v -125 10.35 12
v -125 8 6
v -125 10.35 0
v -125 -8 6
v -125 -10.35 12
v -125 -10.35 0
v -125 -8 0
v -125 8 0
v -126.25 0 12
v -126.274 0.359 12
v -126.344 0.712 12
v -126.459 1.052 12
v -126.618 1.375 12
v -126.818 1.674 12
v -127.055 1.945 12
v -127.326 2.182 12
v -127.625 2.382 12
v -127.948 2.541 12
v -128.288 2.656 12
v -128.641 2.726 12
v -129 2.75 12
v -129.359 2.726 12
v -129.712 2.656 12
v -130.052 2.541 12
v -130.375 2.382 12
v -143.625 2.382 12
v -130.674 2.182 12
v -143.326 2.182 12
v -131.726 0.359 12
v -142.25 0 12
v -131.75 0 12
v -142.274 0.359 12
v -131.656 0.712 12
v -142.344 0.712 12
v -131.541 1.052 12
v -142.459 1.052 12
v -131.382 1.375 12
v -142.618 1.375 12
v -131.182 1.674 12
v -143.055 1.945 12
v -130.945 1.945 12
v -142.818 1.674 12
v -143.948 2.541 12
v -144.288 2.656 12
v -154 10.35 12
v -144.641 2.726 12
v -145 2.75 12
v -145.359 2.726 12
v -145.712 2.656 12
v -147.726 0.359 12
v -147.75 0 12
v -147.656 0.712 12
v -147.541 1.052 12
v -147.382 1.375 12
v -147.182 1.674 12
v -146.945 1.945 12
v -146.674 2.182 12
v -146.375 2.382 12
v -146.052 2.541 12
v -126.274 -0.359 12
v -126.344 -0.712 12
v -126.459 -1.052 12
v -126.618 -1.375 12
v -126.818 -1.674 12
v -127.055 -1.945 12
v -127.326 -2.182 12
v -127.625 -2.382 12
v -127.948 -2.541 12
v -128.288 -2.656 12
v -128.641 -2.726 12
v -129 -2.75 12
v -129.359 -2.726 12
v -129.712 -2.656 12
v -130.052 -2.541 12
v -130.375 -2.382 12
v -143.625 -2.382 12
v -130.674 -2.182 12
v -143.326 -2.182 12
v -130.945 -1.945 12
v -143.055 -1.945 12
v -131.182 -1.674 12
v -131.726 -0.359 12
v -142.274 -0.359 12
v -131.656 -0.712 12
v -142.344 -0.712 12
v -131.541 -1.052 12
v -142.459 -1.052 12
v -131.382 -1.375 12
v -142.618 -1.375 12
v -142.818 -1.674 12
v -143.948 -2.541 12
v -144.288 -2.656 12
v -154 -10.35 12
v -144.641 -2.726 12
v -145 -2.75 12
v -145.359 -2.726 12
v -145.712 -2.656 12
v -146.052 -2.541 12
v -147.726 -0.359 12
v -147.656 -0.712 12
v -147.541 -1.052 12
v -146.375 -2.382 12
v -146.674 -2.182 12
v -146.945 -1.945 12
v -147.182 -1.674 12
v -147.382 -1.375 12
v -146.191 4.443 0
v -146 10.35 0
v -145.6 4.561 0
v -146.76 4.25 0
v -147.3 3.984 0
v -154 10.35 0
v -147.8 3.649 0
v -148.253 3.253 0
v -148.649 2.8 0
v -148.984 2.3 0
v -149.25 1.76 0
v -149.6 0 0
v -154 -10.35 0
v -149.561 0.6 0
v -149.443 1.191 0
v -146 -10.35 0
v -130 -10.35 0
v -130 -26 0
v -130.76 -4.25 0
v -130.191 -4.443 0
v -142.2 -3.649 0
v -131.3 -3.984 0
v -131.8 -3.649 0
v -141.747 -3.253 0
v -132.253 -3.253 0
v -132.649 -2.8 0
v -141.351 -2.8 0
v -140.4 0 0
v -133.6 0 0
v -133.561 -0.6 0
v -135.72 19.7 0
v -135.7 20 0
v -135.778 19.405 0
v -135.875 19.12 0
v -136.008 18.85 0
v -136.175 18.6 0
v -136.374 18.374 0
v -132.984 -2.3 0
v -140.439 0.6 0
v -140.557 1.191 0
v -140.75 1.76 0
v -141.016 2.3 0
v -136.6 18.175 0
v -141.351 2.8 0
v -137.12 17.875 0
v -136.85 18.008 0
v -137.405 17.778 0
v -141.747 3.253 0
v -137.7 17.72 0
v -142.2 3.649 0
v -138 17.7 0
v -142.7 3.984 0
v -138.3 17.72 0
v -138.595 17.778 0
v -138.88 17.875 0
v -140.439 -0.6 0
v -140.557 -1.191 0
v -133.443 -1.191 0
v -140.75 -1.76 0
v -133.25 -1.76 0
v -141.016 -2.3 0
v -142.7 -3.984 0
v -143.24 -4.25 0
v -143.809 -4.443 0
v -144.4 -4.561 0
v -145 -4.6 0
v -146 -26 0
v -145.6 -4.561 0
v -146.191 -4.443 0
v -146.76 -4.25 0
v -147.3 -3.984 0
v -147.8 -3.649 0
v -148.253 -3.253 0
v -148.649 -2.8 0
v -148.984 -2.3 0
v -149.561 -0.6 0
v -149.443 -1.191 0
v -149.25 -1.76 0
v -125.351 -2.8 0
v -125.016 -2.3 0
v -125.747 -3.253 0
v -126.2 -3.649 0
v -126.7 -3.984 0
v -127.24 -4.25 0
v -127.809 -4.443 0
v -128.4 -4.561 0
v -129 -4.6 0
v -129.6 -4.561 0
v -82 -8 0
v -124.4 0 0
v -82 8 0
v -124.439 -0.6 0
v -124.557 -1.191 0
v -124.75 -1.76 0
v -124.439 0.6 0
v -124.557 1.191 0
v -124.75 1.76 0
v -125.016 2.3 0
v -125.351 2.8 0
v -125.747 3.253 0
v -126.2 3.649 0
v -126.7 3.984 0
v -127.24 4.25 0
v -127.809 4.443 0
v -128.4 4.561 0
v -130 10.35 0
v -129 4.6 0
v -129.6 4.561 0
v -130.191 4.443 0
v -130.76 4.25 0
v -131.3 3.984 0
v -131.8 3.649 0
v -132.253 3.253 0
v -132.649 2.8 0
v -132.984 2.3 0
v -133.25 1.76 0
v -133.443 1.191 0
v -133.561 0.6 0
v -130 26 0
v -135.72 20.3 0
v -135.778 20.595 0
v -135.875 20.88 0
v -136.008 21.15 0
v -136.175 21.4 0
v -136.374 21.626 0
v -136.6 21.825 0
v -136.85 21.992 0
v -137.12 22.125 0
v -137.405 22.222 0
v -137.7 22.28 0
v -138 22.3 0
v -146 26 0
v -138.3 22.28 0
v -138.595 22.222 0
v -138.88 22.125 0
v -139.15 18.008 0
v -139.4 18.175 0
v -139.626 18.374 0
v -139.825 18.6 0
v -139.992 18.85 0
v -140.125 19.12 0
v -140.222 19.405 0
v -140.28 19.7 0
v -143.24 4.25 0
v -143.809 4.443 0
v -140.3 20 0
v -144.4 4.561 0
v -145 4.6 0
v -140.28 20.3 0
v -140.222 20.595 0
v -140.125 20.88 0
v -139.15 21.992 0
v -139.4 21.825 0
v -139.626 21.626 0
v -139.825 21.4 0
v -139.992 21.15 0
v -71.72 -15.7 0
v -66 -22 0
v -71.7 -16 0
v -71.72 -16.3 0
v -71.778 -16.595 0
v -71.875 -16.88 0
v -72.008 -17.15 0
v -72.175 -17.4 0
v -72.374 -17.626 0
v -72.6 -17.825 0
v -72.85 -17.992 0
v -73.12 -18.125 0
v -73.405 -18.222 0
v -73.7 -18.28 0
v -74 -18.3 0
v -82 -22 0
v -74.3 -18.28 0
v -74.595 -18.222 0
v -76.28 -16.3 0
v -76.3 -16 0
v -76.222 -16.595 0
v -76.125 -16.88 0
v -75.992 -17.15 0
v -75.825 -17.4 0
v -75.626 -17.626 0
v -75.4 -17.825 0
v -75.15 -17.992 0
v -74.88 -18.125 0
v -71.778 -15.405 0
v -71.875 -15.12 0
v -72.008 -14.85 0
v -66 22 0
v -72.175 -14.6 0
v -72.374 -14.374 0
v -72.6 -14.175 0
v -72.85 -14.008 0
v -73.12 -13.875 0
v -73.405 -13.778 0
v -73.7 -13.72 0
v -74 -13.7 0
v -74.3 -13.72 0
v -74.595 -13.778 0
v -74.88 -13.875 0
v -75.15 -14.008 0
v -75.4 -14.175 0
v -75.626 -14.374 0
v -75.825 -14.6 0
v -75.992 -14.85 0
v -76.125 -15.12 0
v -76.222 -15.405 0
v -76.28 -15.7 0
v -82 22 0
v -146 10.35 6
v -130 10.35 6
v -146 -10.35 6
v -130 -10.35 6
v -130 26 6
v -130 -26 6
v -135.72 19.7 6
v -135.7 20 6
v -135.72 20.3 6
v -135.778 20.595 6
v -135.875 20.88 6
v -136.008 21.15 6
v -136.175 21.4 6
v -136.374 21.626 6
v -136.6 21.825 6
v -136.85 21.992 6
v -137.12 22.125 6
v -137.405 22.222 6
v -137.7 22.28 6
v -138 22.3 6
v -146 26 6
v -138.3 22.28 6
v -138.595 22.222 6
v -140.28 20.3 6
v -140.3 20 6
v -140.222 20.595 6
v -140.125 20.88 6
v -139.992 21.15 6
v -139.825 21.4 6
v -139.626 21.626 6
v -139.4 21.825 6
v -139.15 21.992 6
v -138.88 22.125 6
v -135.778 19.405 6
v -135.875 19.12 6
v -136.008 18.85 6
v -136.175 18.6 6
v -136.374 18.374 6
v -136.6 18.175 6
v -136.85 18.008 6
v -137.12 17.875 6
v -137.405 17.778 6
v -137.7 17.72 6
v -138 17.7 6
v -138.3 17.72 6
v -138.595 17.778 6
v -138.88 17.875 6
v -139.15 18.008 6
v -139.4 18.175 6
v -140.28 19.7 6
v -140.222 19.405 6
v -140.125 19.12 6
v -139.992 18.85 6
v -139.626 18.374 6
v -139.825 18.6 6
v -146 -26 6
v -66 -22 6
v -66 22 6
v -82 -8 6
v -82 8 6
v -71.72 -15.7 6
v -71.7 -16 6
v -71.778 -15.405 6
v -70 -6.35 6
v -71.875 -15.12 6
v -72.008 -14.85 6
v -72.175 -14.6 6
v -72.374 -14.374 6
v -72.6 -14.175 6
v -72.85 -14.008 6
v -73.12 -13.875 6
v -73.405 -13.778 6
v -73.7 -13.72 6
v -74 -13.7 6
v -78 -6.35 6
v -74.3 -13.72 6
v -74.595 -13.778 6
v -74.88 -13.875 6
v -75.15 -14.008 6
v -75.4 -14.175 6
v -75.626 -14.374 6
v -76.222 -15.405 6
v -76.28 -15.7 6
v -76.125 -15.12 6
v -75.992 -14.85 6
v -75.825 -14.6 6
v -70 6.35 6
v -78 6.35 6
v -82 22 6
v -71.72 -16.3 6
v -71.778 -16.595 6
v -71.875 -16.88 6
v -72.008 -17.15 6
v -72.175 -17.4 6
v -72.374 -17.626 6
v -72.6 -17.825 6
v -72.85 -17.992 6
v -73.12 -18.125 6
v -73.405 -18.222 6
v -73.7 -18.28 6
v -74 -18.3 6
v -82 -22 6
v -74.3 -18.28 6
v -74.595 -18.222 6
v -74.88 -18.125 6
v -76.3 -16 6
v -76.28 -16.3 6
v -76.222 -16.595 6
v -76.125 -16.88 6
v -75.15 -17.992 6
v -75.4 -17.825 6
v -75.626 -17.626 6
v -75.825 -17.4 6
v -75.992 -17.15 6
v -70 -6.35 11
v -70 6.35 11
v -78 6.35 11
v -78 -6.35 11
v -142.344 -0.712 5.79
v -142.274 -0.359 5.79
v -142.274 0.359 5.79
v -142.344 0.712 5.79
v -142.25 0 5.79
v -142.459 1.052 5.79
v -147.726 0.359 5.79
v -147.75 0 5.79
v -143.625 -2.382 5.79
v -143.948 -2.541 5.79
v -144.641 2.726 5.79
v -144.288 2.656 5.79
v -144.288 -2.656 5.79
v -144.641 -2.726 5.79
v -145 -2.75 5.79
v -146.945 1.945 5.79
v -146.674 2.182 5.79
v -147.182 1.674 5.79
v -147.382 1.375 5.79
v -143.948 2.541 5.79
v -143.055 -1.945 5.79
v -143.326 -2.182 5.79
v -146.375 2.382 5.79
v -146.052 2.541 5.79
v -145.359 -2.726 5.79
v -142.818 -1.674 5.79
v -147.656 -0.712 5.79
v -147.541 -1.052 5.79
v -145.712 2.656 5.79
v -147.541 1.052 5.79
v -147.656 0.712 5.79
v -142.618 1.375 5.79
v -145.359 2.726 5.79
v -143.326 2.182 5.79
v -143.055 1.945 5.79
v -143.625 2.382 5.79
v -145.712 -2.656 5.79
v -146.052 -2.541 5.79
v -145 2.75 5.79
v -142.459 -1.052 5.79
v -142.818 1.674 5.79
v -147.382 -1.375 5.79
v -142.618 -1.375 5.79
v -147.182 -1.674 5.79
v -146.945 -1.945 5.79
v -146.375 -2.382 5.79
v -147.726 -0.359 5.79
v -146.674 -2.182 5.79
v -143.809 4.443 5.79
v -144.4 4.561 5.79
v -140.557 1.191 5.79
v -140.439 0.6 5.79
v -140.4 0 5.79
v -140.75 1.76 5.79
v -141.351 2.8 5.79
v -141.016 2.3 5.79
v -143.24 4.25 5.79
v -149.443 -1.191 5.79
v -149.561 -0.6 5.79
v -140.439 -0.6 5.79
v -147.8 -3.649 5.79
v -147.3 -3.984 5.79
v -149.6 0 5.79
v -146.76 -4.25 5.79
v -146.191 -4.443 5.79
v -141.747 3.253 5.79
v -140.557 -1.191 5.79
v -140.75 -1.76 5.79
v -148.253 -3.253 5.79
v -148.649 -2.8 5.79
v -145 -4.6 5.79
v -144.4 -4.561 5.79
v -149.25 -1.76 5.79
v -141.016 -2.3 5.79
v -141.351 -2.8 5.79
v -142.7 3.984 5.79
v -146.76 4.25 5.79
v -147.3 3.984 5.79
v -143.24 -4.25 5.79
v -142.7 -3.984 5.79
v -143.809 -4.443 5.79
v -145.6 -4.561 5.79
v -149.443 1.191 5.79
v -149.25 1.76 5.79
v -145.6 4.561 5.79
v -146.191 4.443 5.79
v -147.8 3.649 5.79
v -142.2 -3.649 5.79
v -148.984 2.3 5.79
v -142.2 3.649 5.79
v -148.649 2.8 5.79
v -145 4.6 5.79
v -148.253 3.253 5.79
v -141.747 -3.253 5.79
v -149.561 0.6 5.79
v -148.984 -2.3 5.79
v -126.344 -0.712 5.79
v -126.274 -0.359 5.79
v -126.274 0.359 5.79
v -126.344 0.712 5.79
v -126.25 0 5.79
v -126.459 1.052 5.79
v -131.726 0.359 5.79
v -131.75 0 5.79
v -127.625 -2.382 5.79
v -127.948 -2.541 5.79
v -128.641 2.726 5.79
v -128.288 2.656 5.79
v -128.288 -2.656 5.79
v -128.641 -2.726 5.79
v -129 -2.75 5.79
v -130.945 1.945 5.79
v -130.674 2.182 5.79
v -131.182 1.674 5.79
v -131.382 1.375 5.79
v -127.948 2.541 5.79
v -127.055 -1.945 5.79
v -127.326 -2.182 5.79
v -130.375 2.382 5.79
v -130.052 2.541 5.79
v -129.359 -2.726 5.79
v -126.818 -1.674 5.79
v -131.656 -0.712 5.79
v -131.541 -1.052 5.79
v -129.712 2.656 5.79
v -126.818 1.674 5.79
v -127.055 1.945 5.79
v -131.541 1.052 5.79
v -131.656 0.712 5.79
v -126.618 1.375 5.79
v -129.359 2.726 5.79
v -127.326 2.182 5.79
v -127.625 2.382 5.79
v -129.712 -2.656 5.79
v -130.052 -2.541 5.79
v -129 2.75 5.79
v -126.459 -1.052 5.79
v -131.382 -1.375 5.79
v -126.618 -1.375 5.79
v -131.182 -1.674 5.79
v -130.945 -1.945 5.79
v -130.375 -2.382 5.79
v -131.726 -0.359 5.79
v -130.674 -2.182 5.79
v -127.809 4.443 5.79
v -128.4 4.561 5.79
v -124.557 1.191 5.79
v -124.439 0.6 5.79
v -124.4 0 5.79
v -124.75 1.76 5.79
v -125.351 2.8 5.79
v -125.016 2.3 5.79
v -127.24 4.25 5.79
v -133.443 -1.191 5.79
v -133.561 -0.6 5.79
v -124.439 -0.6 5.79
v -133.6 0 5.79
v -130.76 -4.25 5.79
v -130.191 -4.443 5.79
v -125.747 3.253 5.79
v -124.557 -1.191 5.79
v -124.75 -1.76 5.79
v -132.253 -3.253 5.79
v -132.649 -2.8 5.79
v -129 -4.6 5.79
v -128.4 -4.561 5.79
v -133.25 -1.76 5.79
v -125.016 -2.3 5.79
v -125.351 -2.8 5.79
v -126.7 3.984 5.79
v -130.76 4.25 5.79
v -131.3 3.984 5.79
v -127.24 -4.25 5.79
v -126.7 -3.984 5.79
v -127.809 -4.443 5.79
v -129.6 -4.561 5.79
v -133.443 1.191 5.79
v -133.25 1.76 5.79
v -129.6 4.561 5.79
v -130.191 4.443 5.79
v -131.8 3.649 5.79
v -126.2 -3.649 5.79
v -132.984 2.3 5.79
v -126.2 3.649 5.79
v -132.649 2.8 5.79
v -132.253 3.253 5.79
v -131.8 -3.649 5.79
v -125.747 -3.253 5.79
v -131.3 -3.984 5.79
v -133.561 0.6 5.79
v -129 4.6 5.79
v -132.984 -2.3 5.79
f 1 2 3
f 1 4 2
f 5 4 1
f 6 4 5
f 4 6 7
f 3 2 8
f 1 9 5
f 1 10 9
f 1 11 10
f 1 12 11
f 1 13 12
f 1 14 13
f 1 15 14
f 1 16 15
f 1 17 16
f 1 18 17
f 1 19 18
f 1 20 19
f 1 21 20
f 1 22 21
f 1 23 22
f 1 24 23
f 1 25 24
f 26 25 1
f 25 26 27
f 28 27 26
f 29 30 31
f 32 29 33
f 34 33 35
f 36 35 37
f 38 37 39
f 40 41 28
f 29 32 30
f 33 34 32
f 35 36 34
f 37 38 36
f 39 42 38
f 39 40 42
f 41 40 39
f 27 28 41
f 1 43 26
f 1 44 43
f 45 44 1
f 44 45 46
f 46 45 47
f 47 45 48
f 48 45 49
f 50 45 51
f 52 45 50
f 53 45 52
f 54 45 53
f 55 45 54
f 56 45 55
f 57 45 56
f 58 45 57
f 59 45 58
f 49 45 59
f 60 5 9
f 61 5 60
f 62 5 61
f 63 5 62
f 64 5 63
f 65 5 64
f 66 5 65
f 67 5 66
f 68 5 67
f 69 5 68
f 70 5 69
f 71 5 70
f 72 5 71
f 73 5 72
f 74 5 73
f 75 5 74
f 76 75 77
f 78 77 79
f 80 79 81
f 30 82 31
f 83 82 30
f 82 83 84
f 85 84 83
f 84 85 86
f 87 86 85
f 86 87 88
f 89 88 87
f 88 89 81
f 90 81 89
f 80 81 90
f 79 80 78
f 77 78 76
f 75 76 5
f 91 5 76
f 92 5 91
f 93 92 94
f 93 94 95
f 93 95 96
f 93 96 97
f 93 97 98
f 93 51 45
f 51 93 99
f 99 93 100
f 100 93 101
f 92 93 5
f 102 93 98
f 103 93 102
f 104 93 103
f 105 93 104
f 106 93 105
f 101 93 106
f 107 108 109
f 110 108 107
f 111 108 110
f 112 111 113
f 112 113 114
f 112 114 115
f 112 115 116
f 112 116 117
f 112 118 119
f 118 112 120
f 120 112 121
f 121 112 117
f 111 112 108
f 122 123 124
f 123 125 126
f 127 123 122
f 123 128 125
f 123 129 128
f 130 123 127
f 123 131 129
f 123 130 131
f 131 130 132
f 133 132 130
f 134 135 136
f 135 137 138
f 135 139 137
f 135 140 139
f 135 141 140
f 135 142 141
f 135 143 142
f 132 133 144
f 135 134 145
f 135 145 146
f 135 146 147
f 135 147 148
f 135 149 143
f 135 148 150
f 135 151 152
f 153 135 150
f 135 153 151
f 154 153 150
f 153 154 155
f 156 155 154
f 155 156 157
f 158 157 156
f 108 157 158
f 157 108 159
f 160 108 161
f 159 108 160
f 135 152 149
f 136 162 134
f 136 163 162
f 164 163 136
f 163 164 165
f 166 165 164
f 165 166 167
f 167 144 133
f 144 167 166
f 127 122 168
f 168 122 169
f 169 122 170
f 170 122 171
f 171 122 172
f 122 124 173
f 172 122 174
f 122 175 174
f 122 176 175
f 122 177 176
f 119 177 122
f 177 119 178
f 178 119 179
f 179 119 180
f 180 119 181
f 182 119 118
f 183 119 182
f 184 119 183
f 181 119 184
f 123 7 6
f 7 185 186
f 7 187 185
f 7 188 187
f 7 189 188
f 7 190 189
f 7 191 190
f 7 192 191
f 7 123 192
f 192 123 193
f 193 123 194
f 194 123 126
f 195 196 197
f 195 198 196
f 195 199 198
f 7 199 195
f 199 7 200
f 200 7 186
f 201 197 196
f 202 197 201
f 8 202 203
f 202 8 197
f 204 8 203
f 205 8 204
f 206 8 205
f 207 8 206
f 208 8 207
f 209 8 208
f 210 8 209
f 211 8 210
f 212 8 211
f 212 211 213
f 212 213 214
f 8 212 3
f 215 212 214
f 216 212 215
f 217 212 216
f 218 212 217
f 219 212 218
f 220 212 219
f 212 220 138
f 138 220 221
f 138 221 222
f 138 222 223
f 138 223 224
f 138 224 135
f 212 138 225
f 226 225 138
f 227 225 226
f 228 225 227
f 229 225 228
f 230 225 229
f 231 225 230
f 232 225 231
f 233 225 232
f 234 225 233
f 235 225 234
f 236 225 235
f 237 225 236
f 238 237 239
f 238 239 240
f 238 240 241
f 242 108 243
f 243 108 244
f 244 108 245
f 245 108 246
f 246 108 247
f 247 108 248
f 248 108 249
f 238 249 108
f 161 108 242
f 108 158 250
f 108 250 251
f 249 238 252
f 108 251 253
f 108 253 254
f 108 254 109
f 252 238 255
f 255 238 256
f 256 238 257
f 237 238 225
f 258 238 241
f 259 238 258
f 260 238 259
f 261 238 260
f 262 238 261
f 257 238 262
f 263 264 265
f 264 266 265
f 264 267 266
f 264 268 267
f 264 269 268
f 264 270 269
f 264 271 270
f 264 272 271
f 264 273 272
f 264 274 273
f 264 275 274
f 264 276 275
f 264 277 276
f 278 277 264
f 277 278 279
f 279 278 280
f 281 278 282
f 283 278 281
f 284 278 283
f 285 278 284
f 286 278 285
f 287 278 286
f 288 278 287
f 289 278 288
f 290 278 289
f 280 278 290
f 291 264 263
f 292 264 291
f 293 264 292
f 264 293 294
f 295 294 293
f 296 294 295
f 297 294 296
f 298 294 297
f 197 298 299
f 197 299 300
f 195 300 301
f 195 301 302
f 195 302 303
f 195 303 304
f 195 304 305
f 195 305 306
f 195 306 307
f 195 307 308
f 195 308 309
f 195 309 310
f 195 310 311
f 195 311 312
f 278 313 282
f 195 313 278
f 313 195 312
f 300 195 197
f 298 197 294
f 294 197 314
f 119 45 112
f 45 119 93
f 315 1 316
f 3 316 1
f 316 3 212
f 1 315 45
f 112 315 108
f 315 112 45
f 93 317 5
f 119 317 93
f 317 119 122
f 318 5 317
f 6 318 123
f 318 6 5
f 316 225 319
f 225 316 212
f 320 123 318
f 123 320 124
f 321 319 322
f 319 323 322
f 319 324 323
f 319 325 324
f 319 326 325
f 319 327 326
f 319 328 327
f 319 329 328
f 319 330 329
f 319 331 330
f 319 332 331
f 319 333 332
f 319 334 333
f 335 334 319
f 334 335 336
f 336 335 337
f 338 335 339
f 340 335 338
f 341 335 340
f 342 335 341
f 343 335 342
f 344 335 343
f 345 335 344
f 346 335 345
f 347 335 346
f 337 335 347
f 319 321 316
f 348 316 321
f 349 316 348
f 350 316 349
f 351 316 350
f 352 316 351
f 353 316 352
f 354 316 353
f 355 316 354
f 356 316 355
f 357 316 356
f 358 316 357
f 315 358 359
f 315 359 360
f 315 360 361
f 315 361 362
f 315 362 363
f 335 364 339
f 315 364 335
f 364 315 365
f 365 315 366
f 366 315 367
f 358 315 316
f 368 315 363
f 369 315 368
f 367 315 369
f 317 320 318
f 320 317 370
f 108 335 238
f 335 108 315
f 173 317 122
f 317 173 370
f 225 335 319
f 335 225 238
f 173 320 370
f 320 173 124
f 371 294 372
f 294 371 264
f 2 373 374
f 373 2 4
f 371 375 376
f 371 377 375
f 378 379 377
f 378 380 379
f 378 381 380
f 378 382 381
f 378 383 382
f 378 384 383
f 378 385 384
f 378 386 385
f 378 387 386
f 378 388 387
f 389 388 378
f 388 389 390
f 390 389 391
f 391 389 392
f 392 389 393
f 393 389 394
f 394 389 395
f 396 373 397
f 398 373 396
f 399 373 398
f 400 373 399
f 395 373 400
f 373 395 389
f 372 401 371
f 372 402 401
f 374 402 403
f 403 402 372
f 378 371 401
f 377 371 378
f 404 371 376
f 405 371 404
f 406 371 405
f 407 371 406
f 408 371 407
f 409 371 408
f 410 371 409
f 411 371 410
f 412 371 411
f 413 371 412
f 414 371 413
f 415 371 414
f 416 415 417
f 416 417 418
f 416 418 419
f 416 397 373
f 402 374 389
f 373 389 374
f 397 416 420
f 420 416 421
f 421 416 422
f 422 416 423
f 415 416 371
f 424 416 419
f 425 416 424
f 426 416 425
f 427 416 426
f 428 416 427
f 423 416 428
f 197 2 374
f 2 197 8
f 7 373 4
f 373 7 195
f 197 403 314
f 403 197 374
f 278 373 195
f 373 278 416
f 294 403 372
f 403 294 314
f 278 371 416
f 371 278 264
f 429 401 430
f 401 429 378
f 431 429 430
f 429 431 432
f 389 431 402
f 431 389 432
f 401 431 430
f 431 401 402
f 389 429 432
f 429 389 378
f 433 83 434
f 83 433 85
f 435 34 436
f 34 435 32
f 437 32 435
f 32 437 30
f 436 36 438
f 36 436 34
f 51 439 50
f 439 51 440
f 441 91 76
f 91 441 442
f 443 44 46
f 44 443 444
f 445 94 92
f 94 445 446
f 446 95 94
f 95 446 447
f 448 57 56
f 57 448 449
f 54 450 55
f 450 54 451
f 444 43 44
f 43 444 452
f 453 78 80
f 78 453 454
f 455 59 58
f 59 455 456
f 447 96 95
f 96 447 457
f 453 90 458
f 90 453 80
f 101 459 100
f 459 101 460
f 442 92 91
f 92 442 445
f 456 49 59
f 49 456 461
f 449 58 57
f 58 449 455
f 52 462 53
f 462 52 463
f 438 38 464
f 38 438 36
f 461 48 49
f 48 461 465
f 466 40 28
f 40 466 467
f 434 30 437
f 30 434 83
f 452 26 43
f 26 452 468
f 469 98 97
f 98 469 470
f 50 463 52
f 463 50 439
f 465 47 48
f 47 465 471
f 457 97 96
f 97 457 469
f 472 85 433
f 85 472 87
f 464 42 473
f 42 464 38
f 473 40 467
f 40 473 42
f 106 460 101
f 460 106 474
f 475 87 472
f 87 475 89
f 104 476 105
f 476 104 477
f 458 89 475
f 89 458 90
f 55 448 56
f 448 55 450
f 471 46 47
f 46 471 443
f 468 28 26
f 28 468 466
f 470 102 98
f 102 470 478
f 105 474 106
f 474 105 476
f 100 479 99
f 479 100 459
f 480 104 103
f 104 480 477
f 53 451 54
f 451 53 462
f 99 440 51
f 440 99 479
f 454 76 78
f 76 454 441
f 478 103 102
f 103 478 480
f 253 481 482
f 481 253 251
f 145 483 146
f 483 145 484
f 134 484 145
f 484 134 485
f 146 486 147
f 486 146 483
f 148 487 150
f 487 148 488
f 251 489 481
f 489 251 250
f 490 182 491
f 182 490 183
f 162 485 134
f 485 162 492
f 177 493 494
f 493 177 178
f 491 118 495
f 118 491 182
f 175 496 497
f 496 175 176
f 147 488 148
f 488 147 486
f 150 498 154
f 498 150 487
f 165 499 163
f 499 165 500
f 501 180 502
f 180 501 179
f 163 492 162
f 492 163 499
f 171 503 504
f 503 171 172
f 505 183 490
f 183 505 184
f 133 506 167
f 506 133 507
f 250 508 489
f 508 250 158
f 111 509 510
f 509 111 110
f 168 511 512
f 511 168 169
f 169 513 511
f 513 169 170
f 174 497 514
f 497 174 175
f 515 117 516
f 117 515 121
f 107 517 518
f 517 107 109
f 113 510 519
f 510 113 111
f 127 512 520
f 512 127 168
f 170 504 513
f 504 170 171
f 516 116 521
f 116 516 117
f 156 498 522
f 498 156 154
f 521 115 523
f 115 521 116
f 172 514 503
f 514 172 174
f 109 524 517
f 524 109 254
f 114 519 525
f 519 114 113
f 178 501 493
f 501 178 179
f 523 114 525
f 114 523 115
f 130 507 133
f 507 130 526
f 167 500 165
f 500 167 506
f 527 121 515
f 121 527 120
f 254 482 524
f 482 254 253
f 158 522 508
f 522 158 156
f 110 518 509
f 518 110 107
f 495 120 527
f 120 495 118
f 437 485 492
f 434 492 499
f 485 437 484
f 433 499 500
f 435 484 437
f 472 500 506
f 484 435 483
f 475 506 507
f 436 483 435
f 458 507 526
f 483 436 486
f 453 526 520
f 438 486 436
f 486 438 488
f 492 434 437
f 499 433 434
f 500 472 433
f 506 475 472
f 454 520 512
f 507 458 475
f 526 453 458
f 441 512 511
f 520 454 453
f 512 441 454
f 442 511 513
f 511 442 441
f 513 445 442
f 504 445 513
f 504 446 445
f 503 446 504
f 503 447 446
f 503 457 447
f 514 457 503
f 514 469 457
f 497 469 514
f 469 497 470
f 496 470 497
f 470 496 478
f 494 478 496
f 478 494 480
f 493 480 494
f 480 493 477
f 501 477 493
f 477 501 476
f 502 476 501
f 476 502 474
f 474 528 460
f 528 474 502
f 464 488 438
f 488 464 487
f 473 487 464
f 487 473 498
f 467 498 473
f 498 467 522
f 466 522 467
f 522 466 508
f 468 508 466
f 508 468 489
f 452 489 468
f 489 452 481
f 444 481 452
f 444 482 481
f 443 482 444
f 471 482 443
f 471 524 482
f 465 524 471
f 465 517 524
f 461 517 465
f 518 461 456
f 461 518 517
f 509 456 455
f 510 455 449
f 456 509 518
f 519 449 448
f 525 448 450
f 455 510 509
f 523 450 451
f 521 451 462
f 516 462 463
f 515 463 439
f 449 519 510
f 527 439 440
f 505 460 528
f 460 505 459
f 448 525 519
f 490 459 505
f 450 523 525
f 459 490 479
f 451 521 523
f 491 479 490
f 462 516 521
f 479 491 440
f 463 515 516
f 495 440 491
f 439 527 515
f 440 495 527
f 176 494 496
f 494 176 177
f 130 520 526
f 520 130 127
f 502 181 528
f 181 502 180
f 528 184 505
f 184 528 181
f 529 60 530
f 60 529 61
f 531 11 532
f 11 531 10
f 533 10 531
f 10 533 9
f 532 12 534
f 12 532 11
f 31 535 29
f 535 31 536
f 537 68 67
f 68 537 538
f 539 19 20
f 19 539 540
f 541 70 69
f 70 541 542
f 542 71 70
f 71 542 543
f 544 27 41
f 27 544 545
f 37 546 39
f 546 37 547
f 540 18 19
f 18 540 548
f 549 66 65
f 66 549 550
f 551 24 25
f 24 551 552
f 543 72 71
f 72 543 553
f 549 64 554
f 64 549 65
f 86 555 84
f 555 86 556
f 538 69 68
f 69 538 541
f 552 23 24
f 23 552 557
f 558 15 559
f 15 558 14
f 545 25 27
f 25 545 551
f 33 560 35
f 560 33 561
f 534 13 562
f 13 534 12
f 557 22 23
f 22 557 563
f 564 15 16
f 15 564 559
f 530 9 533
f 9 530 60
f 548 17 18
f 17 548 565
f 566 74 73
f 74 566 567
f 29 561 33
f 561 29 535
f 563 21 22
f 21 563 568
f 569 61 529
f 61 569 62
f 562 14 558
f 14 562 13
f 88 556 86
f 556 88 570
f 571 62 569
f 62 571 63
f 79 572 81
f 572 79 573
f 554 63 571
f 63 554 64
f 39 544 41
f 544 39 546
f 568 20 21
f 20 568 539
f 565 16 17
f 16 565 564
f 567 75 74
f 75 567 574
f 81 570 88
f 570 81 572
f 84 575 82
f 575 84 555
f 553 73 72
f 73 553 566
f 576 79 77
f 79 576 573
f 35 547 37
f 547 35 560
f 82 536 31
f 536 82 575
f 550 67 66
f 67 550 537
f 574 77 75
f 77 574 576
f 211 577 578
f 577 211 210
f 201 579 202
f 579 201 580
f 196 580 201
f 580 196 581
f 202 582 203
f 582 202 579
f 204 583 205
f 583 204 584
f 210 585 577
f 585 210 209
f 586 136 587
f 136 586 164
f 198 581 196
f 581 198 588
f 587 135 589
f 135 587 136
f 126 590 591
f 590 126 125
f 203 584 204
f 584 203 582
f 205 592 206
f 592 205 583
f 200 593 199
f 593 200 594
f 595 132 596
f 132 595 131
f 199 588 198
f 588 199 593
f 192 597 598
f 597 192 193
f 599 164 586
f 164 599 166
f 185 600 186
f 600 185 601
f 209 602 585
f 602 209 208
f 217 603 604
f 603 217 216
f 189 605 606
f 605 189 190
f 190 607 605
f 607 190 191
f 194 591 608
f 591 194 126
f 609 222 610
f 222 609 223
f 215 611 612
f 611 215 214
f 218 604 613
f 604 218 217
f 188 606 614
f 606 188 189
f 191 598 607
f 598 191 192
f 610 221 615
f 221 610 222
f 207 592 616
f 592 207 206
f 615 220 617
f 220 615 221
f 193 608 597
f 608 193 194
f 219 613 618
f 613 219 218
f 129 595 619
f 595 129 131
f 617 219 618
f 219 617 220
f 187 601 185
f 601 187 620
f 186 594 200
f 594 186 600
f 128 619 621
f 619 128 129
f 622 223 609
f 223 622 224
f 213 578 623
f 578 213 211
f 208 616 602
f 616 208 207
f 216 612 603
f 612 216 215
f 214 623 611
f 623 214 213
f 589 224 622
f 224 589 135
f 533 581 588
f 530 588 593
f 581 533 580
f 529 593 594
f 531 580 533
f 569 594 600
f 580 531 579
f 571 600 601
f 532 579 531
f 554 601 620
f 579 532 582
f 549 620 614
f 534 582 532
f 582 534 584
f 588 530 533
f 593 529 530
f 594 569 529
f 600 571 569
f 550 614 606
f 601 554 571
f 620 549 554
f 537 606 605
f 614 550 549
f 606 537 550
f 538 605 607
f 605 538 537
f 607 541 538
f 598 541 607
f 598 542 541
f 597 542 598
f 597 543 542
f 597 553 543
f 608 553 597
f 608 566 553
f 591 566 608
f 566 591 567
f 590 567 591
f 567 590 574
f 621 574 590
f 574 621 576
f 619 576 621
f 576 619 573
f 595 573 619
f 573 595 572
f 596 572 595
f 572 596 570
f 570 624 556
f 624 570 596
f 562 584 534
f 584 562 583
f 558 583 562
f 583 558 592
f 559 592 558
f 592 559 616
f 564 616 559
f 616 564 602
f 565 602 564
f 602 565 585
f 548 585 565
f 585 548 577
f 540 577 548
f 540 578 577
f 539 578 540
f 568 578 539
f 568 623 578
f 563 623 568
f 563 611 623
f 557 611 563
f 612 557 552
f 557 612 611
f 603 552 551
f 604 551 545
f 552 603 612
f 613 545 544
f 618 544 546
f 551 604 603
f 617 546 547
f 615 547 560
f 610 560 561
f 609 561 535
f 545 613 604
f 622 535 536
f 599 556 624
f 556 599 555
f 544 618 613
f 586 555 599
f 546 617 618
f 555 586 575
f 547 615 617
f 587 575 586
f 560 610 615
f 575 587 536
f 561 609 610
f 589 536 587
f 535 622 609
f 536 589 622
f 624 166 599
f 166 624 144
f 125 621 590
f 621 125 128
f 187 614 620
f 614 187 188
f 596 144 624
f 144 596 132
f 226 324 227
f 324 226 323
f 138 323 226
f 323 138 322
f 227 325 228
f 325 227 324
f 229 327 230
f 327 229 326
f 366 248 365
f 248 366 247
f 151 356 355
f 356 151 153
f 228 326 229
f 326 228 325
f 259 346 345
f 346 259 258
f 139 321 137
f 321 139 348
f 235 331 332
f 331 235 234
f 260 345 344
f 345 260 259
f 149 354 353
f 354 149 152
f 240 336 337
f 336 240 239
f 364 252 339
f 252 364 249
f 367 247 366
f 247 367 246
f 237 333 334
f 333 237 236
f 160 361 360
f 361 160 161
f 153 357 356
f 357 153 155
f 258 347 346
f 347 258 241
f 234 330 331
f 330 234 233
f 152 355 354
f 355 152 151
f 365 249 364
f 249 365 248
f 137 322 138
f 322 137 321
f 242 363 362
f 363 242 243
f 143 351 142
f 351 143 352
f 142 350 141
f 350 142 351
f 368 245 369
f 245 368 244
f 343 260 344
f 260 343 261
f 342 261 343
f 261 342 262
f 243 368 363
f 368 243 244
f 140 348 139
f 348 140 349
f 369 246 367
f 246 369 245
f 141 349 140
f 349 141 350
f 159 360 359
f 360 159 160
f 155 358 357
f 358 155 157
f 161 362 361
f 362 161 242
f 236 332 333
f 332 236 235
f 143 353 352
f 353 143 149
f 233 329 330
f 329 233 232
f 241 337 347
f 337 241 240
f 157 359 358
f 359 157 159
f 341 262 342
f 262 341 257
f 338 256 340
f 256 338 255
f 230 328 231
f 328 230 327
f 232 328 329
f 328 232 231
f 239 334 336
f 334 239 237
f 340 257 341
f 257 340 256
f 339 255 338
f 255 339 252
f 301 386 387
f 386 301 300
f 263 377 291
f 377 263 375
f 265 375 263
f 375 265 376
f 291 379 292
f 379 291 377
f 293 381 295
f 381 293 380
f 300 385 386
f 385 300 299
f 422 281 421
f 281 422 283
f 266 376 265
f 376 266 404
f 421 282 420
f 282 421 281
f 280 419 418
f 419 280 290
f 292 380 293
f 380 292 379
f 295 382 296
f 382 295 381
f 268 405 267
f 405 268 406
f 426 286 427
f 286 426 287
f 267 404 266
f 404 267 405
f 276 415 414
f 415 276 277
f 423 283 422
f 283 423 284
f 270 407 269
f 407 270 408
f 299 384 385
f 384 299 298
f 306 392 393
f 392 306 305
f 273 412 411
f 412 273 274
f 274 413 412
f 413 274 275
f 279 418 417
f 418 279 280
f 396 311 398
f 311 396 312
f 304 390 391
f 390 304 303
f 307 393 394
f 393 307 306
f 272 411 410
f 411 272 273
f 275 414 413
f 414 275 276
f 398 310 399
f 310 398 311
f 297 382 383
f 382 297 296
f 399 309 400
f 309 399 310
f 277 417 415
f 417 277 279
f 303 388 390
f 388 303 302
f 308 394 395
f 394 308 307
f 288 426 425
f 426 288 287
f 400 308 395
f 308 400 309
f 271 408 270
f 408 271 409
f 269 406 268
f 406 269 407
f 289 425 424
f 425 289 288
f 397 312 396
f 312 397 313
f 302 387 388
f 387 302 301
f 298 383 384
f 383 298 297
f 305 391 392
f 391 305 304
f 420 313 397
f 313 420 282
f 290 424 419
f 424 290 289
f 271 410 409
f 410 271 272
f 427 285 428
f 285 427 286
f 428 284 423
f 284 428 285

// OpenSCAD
// file: lib.scad
// 공통 도형. include <config.scad> 뒤에 include 하세요.

module slot2d(L, W) {           // 긴 방향이 Y인 둥근 직사각형
    hull() {
        translate([0, -(L - W)/2]) circle(d = W);
        translate([0,  (L - W)/2]) circle(d = W);
    }
}

module sector2d(a0, a1, R) {
    polygon(concat([[0, 0]], [for (a = [a0 : 5 : a1]) [R*cos(a), R*sin(a)]], [[R*cos(a1), R*sin(a1)]]));
}

// JGA25-370 축: 한쪽만 깎인 D컷 (깎인 면이 +X)
module dshaft_jga2d(c) {
    r = jga_shaft_d/2;
    intersection() {
        circle(d = jga_shaft_d + 2*c);
        translate([-r - c, -r - c]) square([jga_shaft_flat + 2*c, jga_shaft_d + 2*c]);
    }
}

// 28BYJ-48 축: 양쪽이 깎인 D컷
module dshaft_byj2d(c) {
    intersection() {
        circle(d = byj_shaft_d + 2*c);
        square([byj_shaft_flat + 2*c, byj_shaft_d * 2], center = true);
    }
}

// 가로로 뚫는 구멍용 물방울 모양 (뾰족한 쪽이 +Y → 출력 시 위쪽)
module teardrop2d(d) {
    union() {
        circle(d = d);
        polygon([[-d/2*cos(45), d/2*sin(45)], [0, d/2/sin(45)], [d/2*cos(45), d/2*sin(45)]]);
    }
}

// 꼭대기를 잘라 낸 물방울 (얇은 벽을 뚫지 않게)
module teardrop_flat2d(d, cap) {
    intersection() {
        teardrop2d(d);
        translate([-d, -d]) square([2*d, d + d/2 + cap]);
    }
}

module m3_nut_pocket(h) {        // 세로 육각 주머니
    cylinder(d = m3_nut_af / cos(30), h = h, $fn = 6);
}

// 옆에서 너트를 밀어 넣는 홈: +X 방향으로 열림
module m3_nut_slot(len) {
    hull() {
        m3_nut_pocket(m3_nut_t);
        translate([len, 0, 0]) m3_nut_pocket(m3_nut_t);
    }
}

module slotted_hole(d, len, h) { // X 방향 긴 구멍
    hull() {
        translate([-len/2, 0, 0]) cylinder(d = d, h = h);
        translate([ len/2, 0, 0]) cylinder(d = d, h = h);
    }
}
// file: config.scad
// =====================================================================
// 루틴 디스펜서 v2 (8칸: 가루 4 + 알약 4) · 공통 치수
// ---------------------------------------------------------------------
// 모든 부품 파일이 이 파일을 include 합니다. 숫자는 여기서만 고치세요.
// ★ = 추정치. 부품이 도착하면 측정표대로 재서 바꿉니다.
// 좌표: X 왼→오, Y 앞→뒤, Z 아래→위 (mm). 원점은 두 스테이션 사이, 바닥판 윗면 높이.
// 왼쪽 = 가루 스테이션, 오른쪽 = 알약 스테이션
// =====================================================================

$fn = 48;

// ---- 프린터 공차 (공차 쿠폰으로 확정) --------------------------------
clear      = 0.3;    // 끼워 맞춤 한쪽 여유 (쿠폰 C줄 3번으로 확정)
byj_d_clear = 0.15;  // 28BYJ 축 ↔ 원판 D구멍 여유 (쿠폰 B줄 4번으로 확정)
jga_d_clear = 0.2;   // JGA 축 ↔ 스크류 허브 D구멍 여유 (쿠폰 J줄 5번으로 확정 2026-10-21. 실측 축 3.9 · D컷 3.4 이지만
                     //  쿠폰이 아래 치수도 값 기준이라 jga_shaft_d · flat 은 그대로 둬야 같은 구멍이 나옴)
m3_hole    = 3.6;    // M3 나사가 헐겁게 지나가는 구멍 (쿠폰 M줄 5번으로 확정 2026-10-21)
m3_nut_af  = 5.8;    // M3 너트 맞변 거리 + 여유 (육각 주머니, 쿠폰 H줄 3번으로 확정 2026-10-21)
m3_nut_t   = 2.7;    // ★ M3 너트 두께 + 여유
m3_head_d  = 6.2;    // 렌치볼트 머리 지름 + 여유
auger_gap  = 0.5;    // 스크류 날개 ↔ 관 벽 한쪽 틈. 스크류 지름만 바뀜 (관 16 고정)
                     // 좁히면 덜 새지만 가루가 끼어 모터가 멈출 수 있음. 가루 시험 전엔 0.5 유지

// ---- 나사 대신 쓰는 것 ------------------------------------------------
// 핀: 출력한 작은 원기둥. 구멍에 떨어뜨려 넣고 부품을 얹으면 자리가 잡힘 (무게로 눌림)
pin_d   = 4;
pin_len = 6.5;
pin_hole = pin_d + 2*clear;
// 기둥 끝 네모 돌기: 바닥판·상판의 네모 구멍에 끼움
peg_w = 6;  peg_h = 4;
peg_hole = peg_w + 2*clear;

// ---- 가루 모터: JGA25-370 6V 77RPM (상품 치수도 기준) ------------------
jga_gear_d    = 24.6;  // 감속기 지름 (실측 2026-10-21, 치수도 25). 받침에 얹혀 축 높이를 정하므로 실측값
jga_gear_len  = 23;    // 감속기 길이 — 77RPM 은 23 (치수도 표, 실측 일치)
jga_motor_d   = 24;    // 모터 몸통 지름 (실측, 치수도 24.4)
jga_motor_len = 30.8;  // 모터 몸통 길이 (치수도. 실측 30.6 이라 치수도 값을 그대로 둠)
jga_term_len  = 4;     // 뒤쪽 단자 (치수도)
jga_shaft_d   = 4;     // 축 지름 (치수도)
jga_shaft_flat= 3.5;   // 축 D컷 (치수도)
jga_shaft_len = 11.5;  // 감속기 앞면 → 축 끝 (치수도)
jga_boss_d    = 7;     // 앞면 돌기 (치수도)
jga_boss_h    = 2.5;   // (치수도)
jga_len       = jga_gear_len + jga_motor_len + jga_term_len;

// ---- 알약 모터: 28BYJ-48 --------------------------------------------
// 출처: 제조사 도면 (components101 28BYJ-48 dimensions) + 사용자 실측 (2026-10-04)
byj_body_d    = 28;    // 도면 Ø28
byj_body_h    = 19.4;  // 실측 19.4 (도면 19)
byj_ear_span  = 35;    // 도면 35±0.2, 실측 (안쪽 벽 + 바깥쪽 벽) / 2 로 확인
byj_ear_hole  = 4.2;   // 도면 Ø4.2
byj_shaft_off = 8;     // 도면: 몸통 중심 → 축 8
byj_shaft_d   = 5;     // 도면 Ø5
byj_shaft_flat= 3;     // 도면: 양쪽 D컷 폭 3
byj_shaft_len = 8.5;   // 도면: 몸통 윗면 → 축 끝 10, 돌기 1.5 → 돌기 윗면에서 8.5
byj_flat_len  = 6;     // 도면: D컷 길이 6 (축 끝에서부터). 그 아래는 둥근 축
byj_ear_t     = 0.8;   // 고정 귀 두께 (도면에 없음, 설계에서 안 씀)
byj_boss_d    = 9;     // 도면 Ø9
byj_boss_h    = 1.5;   // 도면 1.5
byj_cover_w   = 14.6;  // 도면: 파란 전선 덮개 폭
byj_cover_r   = 17;    // 도면: 몸통 중심 → 덮개 끝 17 (실측: 몸통 밖으로 3)
byj_conn_w    = 15;    // 실측: 흰색 커넥터(JST XH 5핀) 폭
byj_conn_t    = 5.5;   // 실측: 두께
byj_conn_l    = 8;     // 실측: 길이 (전선 방향)

// ---- 로드셀 1kg (VLT-LCS002, 상품 치수도 기준) ------------------------
lc_l      = 80;        // 치수도
lc_w      = 12.7;      // 치수도
lc_h      = 12.7;      // 치수도
lc_holes_fix  = [5, 21];      // 고정 끝(M5, 넓은 구멍) 끝면에서 구멍 중심까지 (실측 2026-10-21: 구멍 5.0, 간격 16.0, 끝→구멍 끝 2.5)
lc_holes_load = [5.4, 21.3];  // 하중 끝(M4, 좁은 구멍) (실측: 구멍 4.15, 간격 15.9, 끝→구멍 끝 3.3). 치수도는 둘 다 [5, 20]
// 전선이 나오는 끝 = M5 두 개 = 고정 끝(받침). 반대 끝 = M4 두 개 = 쟁반.
lc_fix_bolt_d  = 5.5;  lc_fix_head_d  = 9.2;  lc_fix_head_h  = 5.8;   // M5x15 (머리 자리 천장이 처져도 머리가 안 튀어나오게 0.8 여유)
lc_load_bolt_d = 4.5;  lc_load_head_d = 7.6;  lc_load_head_h = 4.2;   // M4x12

// ---- 컵 (다이소, 미정) ------------------------------------------------
cup_bottom_d = 55;     // ★ 바닥 지름
cup_top_d    = 75;     // ★ 입구 지름 (가루 출구 4개가 이 안에 떨어져야 함)
cup_h        = 75;     // ★ 높이
function cup_d_at(h) = cup_bottom_d + (cup_top_d - cup_bottom_d) * h / cup_h;

// ---- 알약 -------------------------------------------------------------
// 최대 알약: 모듈 몸체(치마·바닥·덮개·알약 상판 미끄럼관)를 이 크기로 만듦. 한 번만 뽑음.
pill_max_l = 26;       // ★ 오메가3 1000mg 연질캡슐급 (흔히 약 25 × 10~11)보다 조금 크게
pill_max_w = 11;       // ★
pill_max_t = 11;       // ★ 연질캡슐은 단면이 둥글어서 두께 = 폭
// 칸에 넣을 알약: 원판 칸·원판 두께·받침판을 이 크기로 만듦. 알약을 바꾸면 원판·받침판만 다시 뽑음.
pill_l = 18.2;         // 실측: 종근당 멀티비타민 길이
pill_w = 9.2;          // 실측: 폭
pill_t = 5.9;          // 실측: 누웠을 때 두께

// ---- 전자부품 ----------------------------------------------------------
pb_w = 89;  pb_d = 52; pb_t = 1.6;       // 만능기판 (상품명 치수) · 두께 ★
esp_w = 48.1; esp_d = 27.9; esp_t = 1.8; // ESP32 DevKitC 호환 (실측: 기판 길이 · 폭 · 두께)
esp_ant = 55.3 - esp_w;                    // 안테나가 기판 끝(-Y) 밖으로 튀어나온 길이 (실측 전체 55.3)
dcj_d = 11;  dcj_l = 30;                 // ★ DC 잭 몸통 지름·길이
uln_w = 35;  uln_d = 33; uln_t = 1.6;    // ULN2003 보드 (상품 설명 35×33) · 두께 ★
mcp_w = 55;  mcp_d = 32; mcp_t = 1.6;    // ★ MCP23017 보드
hx_w  = 35;  hx_d  = 21; hx_t  = 1.6;    // ★ HX711 보드
hall_w = 4.2; hall_l = 3.2; hall_t = 1.6; // 49E 홀 센서 알맹이 (TO-92S). 실측 4.1 × 3.2 × 1.5 (2026-10-21) → 이 값이 살짝 커서 그대로. KY-035 보드에서 떼어 다리에 단선 납땜
mag_d = 8;   mag_t = 3;                  // 원판 원점 자석 (ND 8Ø×3t)

// ---- 뼈대 (스테이션마다 바닥판 + 상판 + 기둥) ------------------------
base_t   = 6;          // 바닥판 두께 (아랫면에 너트 주머니)
deck_t   = 5;          // 상판 두께
deck_z   = 120;        // 상판 아랫면 높이
deck_top = deck_z + deck_t;
rim_h    = 6;          // 상판 테두리 (아래로)
rim_w    = 3;
post_w   = 14;

cupP  = [-110, 0];     // 가루 스테이션 중심 = 가루 컵 중심
cupL  = [ 105, 0];     // 알약 스테이션 중심 = 알약 컵 중심
sizeP = [210, 210];    // 가루 스테이션 판 크기
sizeL = [205, 205];    // 알약 스테이션 판 크기
// 기둥: 모듈 발판·모터 아래를 피하고, 앞쪽(-Y)은 컵을 꺼내는 길이라 비움
postsP = [for (p = [[-93,-45],[93,-45],[-93,45],[93,45],[-93,0],[93,0],[0,93]]) [cupP[0]+p[0], cupP[1]+p[1]]];
postsL = [for (p = [[-92,-92],[92,-92],[-92,92],[92,92],[-92,0],[92,0],[0,92]]) [cupL[0]+p[0], cupL[1]+p[1]]];
ctrl_c    = [cupL[0], cupL[1] + sizeL[1]/2 + 50];   // 제어함 (알약 스테이션 뒤, 탁자 위)
ctrl_size = [190, 90];

// ---- 배치 --------------------------------------------------------------
powder_d   = 13;                 // 컵 중심 → 가루 모듈 출구 끝면
powder_a   = [45, 135, 225, 315];// 가루 모듈 방향 (X자)
pill_s     = 51;                // 알약 모듈 중심의 X·Y 거리 (2×2)

// ---- 출력 영역 (Ender-3 SE) ------------------------------------------
bed = [220, 220, 250];
// main file
// =====================================================================
// 저울: 로드셀 받침(고정 끝 + 과부하 멈춤대) + 컵 쟁반(움직이는 끝) + 간격 와셔
// 전역 좌표 (원점 = 바닥판 윗면 가운데). 로드셀은 X 방향으로 누움.
// 고정 끝(전선 나오는 쪽) = M5x15 두 개, 아래에서 위로.
// 움직이는 끝 = M4x12 두 개, 쟁반 위에서 아래로.
// =====================================================================
include <config.scad>
include <lib.scad>

part = "pedestal";   // "pedestal" | "tray" | "spacer" | "all"

lc_x0   = cupP[0] - lc_l/2;       // 고정 끝
lc_x1   = cupP[0] + lc_l/2;       // 움직이는 끝
ped_h   = 12;
lc_z0   = ped_h;                  // 로드셀 아랫면
sp_h    = 3;                      // 간격 와셔 두께 (쟁반이 로드셀 몸통에 닿지 않게)
tray_z0 = lc_z0 + lc_h + sp_h;    // 쟁반 아랫면
tray_t  = 7;
ring_h  = 4;
tray_d  = cup_d_at(4) + 2*clear + 2*3;
cup_z0  = tray_z0 + tray_t;       // 컵 바닥 높이
strip_h = 6;                      // 받침 아래 띠 + 날개
stop_gap = 1.0;                   // 멈춤대 ↔ 로드셀 아랫면 (1kg 에서 휘는 양보다 큼)
stop_x  = lc_x1 - 4;

// 바닥판 핀 2개 (대각선) — 받침은 나사 없이 핀에 얹음
function scale_base_holes() = [[lc_x0 + 12, 20], [stop_x, -16]];
function cup_top_z() = cup_z0 + cup_h;
function cup_z_powder() = cup_z0;
function scale_tray_top() = cup_z0;

// 볼트 물림 길이 (로드셀 나사산에 들어가는 길이)
m5_bite = 15 - (ped_h - lc_fix_head_h);
m4_bite = 12 - (tray_t - lc_load_head_h) - sp_h;
echo(str("M5 물림 ", m5_bite, "mm, M4 물림 ", m4_bite, "mm (로드셀 두께 ", lc_h, ")"));
assert(m5_bite >= 5 && m5_bite < lc_h, "M5 길이 확인");
assert(m4_bite >= 5 && m4_bite < lc_h, "M4 길이 확인");

module pedestal() {
    difference() {
        union() {
            translate([lc_x0 - 4, -lc_w/2 - 4, 0]) cube([lc_holes_fix[1] + 8, lc_w + 8, ped_h]);
            translate([lc_x0 + 4, -26, 0]) cube([16, 52, strip_h]);              // 고정 날개
            translate([lc_x0 - 4, -8, 0]) cube([lc_l + 8, 16, strip_h]);         // 멈춤대까지 띠
            translate([stop_x - 8, -22, 0]) cube([16, 44, strip_h]);             // 멈춤대 쪽 날개
            translate([stop_x - 4, -lc_w/2, 0]) cube([8, lc_w, lc_z0 - stop_gap]); // 멈춤대
        }
        for (h = [lc_holes_fix[0], lc_holes_fix[1]]) translate([lc_x0 + h, 0, 0]) {
            translate([0, 0, -1]) cylinder(d = lc_fix_bolt_d, h = ped_h + 2);
            translate([0, 0, -0.01]) cylinder(d = lc_fix_head_d, h = lc_fix_head_h);   // 머리 (아래에서)
        }
        for (p = scale_base_holes()) translate([p[0], p[1], -1]) cylinder(d = pin_hole, h = strip_h + 2);
    }
}

module tray() {
    difference() {
        union() {
            translate([0, 0, tray_z0]) hull() {
                translate([cupP[0], cupP[1], 0]) cylinder(d = tray_d, h = tray_t);
                translate([lc_x1 - lc_holes_load[1] - 6, -8, 0]) cube([lc_holes_load[1] + 6, 16, tray_t]);
            }
            // 컵 받침 링: 링 꼭대기 높이에서의 컵 지름에 맞춤
            translate([cupP[0], cupP[1], cup_z0 - 0.01]) difference() {
                cylinder(d = cup_d_at(ring_h) + 2*clear + 4, h = ring_h);
                translate([0, 0, -1]) cylinder(d = cup_d_at(ring_h) + 2*clear, h = ring_h + 2);
            }
        }
        for (h = lc_holes_load) translate([lc_x1 - h, 0, tray_z0]) {
            translate([0, 0, -1]) cylinder(d = lc_load_bolt_d, h = tray_t + 2);
            translate([0, 0, tray_t - lc_load_head_h]) cylinder(d = lc_load_head_d, h = lc_load_head_h + 1);
        }
    }
}

module spacer() {
    difference() { cylinder(d = 10, h = sp_h); translate([0, 0, -1]) cylinder(d = lc_load_bolt_d, h = sp_h + 2); }
}

module spacers_placed() {
    for (h = lc_holes_load) translate([lc_x1 - h, 0, lc_z0 + lc_h]) spacer();
}

module loadcell_ghost() {
    translate([lc_x0, -lc_w/2, lc_z0]) cube([lc_l, lc_w, lc_h]);
}

module cup_ghost(xy, z0) {
    translate([xy[0], xy[1], z0]) cylinder(d1 = cup_bottom_d, d2 = cup_top_d, h = cup_h);
}

module scale_all() {
    color("DimGray") pedestal();
    color("LightGray") tray();
    color("Gray") spacers_placed();
    %loadcell_ghost();
    %cup_ghost(cupP, cup_z0);
}

if      (part == "pedestal") pedestal();
else if (part == "tray")     translate([0, 0, -tray_z0]) tray();
else if (part == "spacer")   spacer();
else if (part == "all")      scale_all();
